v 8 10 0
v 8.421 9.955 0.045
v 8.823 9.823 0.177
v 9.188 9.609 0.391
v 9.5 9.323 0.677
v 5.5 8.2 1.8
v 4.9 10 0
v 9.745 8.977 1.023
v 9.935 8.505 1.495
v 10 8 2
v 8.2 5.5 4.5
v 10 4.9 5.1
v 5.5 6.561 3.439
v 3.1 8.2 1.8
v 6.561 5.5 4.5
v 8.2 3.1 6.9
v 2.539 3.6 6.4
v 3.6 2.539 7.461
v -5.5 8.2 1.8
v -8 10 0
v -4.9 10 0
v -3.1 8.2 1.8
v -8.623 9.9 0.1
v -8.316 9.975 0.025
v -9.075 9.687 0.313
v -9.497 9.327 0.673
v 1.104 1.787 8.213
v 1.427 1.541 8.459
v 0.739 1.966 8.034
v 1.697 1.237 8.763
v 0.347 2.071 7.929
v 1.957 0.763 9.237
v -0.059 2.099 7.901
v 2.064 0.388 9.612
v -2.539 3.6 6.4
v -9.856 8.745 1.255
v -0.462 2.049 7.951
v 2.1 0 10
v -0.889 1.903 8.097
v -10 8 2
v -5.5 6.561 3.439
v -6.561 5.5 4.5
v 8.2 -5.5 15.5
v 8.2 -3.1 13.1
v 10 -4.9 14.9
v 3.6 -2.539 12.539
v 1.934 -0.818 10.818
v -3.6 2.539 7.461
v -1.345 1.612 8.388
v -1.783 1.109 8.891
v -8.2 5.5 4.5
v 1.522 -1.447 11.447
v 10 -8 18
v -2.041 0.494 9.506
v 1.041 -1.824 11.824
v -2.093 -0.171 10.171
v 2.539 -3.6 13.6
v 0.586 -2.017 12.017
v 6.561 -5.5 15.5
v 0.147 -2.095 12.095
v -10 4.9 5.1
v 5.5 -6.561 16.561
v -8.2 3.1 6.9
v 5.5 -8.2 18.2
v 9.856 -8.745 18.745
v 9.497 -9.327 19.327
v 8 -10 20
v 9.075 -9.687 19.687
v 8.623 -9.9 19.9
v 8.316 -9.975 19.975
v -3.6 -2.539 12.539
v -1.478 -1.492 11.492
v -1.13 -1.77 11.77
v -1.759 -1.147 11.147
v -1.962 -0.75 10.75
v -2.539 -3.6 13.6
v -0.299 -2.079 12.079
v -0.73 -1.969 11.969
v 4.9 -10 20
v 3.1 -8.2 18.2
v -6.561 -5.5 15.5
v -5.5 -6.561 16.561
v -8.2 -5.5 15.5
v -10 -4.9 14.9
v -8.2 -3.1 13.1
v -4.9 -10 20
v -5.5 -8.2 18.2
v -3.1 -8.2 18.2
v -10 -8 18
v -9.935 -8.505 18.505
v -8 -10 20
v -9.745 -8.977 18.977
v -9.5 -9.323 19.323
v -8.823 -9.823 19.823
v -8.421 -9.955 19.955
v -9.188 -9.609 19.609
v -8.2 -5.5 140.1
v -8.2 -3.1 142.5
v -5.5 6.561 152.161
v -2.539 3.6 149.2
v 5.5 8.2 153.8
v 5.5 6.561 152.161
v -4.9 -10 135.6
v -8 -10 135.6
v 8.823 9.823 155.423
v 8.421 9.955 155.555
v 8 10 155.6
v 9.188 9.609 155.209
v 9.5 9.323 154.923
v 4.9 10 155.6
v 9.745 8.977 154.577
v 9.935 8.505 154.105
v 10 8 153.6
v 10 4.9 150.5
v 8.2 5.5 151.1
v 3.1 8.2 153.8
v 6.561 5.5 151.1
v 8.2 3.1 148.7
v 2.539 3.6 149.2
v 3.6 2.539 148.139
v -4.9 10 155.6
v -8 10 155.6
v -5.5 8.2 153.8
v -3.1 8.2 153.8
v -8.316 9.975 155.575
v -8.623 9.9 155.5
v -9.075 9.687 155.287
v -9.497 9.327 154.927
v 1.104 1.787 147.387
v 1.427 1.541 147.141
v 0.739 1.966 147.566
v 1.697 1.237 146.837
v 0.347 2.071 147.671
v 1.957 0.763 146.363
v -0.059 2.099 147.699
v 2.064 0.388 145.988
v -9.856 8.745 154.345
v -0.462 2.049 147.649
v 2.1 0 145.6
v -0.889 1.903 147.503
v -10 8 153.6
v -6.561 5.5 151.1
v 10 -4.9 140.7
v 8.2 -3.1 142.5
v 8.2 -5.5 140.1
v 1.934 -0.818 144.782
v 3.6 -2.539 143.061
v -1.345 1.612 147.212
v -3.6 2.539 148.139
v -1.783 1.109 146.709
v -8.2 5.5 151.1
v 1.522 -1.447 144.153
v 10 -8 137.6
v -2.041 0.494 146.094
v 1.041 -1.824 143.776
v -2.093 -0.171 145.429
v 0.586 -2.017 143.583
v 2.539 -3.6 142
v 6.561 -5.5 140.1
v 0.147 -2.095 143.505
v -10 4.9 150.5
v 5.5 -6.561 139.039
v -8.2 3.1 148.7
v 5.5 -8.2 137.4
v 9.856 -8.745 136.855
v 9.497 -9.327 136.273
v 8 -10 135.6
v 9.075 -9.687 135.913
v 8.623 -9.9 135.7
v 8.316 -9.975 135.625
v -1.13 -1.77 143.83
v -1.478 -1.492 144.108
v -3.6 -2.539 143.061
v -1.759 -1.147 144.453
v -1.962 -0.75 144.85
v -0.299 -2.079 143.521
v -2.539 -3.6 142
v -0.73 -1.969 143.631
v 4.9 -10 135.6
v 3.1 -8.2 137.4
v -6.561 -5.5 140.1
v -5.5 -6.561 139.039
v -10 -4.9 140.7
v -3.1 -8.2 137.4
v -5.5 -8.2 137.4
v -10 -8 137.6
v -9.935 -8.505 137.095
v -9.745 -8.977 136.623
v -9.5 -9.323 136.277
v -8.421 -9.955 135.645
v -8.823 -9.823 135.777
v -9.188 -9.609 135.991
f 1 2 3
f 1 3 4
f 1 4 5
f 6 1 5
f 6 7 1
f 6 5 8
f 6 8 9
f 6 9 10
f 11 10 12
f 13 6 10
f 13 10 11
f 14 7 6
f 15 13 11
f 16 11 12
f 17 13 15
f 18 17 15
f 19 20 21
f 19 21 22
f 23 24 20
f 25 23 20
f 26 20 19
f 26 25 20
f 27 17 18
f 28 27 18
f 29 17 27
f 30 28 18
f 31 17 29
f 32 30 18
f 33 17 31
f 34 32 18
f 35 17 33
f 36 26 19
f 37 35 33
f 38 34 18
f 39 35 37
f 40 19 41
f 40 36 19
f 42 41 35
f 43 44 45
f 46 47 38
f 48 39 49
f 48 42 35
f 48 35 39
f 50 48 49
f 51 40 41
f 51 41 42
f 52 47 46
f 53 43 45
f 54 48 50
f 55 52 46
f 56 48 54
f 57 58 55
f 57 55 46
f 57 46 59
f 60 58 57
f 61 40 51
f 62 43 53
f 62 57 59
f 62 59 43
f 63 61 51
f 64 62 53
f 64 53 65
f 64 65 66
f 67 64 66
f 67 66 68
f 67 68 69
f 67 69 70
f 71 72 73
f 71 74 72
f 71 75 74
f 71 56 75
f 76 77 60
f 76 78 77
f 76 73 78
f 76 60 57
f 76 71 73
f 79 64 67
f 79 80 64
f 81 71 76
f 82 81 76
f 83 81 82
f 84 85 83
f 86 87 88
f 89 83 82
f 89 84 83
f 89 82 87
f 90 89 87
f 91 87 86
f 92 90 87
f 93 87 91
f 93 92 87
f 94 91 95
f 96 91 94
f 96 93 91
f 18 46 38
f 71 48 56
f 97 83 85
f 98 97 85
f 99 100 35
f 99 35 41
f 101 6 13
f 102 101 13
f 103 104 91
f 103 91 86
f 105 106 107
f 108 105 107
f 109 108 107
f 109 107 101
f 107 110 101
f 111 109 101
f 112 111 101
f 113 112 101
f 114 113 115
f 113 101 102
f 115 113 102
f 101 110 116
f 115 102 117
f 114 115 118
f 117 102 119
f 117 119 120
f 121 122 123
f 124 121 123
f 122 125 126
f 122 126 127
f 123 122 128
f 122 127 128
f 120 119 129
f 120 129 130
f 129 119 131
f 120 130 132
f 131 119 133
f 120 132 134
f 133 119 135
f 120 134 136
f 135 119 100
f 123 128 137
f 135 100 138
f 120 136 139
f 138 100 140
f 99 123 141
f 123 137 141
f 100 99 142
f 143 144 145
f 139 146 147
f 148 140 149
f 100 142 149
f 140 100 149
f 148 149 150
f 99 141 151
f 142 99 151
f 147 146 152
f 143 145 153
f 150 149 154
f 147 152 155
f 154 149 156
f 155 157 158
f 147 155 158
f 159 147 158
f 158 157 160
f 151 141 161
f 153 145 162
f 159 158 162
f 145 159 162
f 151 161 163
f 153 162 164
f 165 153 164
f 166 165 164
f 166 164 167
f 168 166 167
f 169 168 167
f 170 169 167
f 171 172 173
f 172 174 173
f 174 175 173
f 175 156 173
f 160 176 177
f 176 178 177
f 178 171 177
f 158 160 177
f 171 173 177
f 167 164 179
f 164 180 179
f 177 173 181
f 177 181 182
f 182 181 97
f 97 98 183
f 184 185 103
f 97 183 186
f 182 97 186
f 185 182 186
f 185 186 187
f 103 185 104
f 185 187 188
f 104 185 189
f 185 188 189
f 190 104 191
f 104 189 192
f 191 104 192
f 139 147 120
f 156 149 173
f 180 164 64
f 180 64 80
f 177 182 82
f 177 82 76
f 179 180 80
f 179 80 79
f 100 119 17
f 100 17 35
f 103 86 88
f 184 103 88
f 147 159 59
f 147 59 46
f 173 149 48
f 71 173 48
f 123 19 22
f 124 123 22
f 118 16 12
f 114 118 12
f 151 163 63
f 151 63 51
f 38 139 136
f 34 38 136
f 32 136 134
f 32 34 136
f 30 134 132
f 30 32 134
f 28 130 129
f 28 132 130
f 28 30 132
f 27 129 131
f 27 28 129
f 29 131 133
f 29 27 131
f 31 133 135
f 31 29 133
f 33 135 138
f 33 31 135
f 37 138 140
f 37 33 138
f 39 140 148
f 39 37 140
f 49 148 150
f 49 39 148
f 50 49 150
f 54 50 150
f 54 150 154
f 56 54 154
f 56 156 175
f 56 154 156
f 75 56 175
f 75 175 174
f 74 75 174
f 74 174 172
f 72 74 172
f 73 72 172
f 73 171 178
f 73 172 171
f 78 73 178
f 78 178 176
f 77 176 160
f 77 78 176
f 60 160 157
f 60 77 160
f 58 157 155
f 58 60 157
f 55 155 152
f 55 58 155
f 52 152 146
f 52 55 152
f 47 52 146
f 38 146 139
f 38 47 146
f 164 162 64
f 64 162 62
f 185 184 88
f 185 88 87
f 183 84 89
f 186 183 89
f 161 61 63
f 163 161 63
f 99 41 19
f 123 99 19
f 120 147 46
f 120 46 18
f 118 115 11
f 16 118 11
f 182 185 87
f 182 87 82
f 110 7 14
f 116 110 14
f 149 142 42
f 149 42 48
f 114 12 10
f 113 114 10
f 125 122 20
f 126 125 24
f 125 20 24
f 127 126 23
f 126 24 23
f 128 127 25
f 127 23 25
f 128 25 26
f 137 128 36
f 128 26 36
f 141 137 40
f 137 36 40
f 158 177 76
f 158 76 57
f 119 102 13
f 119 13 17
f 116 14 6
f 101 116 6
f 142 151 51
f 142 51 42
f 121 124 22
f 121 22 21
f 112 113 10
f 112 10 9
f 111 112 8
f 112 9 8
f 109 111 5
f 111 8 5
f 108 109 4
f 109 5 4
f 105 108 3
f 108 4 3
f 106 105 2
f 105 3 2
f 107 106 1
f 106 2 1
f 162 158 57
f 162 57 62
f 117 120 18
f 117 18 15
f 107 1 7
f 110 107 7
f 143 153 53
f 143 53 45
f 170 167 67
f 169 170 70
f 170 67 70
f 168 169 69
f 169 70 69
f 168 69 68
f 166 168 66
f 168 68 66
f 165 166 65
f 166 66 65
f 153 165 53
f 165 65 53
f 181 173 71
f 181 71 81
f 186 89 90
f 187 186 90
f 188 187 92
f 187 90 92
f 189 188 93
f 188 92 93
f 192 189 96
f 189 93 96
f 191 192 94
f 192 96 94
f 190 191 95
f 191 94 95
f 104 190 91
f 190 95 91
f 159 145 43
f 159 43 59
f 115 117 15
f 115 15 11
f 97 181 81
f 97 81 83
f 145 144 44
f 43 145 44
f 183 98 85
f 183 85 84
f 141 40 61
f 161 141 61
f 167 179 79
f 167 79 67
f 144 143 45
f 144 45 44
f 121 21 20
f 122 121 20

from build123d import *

# Parameters (mm, degrees)
SKETCH1_R           = 2.1
BOSS_EXTRUDE1_DEPTH = 155.6
CUT_EXTRUDE1_DEPTH  = 66


with BuildPart() as part:
    # Sketch1 → Boss-Extrude1 (new body)
    with BuildSketch(Plane.XY):
        with BuildLine():
            Line((-4.9, -10), (-3.1, -8.2))
            Line((-3.1, -8.2), (-5.5, -8.2))
            Line((-5.5, -8.2), (-5.5, -6.560660172))
            Line((-5.5, -6.560660172), (-2.539339828, -3.6))
            Line((-2.539339828, -3.6), (2.539339828, -3.6))
            Line((2.539339828, -3.6), (5.5, -6.560660172))
            Line((5.5, -6.560660172), (5.5, -8.2))
            Line((5.5, -8.2), (3.1, -8.2))
            Line((3.1, -8.2), (4.9, -10))
            Line((4.9, -10), (8, -10))
            ThreePointArc((8, -10), (9.414213562, -9.414213562), (10, -8))
            Line((10, -8), (10, -4.9))
            Line((10, -4.9), (8.2, -3.1))
            Line((8.2, -3.1), (8.2, -5.5))
            Line((8.2, -5.5), (6.560660172, -5.5))
            Line((6.560660172, -5.5), (3.6, -2.539339828))
            Line((3.6, -2.539339828), (3.6, 2.539339828))
            Line((3.6, 2.539339828), (6.560660172, 5.5))
            Line((6.560660172, 5.5), (8.2, 5.5))
            Line((8.2, 5.5), (8.2, 3.1))
            Line((8.2, 3.1), (10, 4.9))
            Line((10, 4.9), (10, 8))
            ThreePointArc((10, 8), (9.414213562, 9.414213562), (8, 10))
            Line((8, 10), (4.9, 10))
            Line((4.9, 10), (3.1, 8.2))
            Line((3.1, 8.2), (5.5, 8.2))
            Line((5.5, 8.2), (5.5, 6.560660172))
            Line((5.5, 6.560660172), (2.539339828, 3.6))
            Line((2.539339828, 3.6), (-2.539339828, 3.6))
            Line((-2.539339828, 3.6), (-5.5, 6.560660172))
            Line((-5.5, 6.560660172), (-5.5, 8.2))
            Line((-5.5, 8.2), (-3.1, 8.2))
            Line((-3.1, 8.2), (-4.9, 10))
            Line((-4.9, 10), (-8, 10))
            ThreePointArc((-8, 10), (-9.414213562, 9.414213562), (-10, 8))
            Line((-10, 8), (-10, 4.9))
            Line((-10, 4.9), (-8.2, 3.1))
            Line((-8.2, 3.1), (-8.2, 5.5))
            Line((-8.2, 5.5), (-6.560660172, 5.5))
            Line((-6.560660172, 5.5), (-3.6, 2.539339828))
            Line((-3.6, 2.539339828), (-3.6, -2.539339828))
            Line((-3.6, -2.539339828), (-6.560660172, -5.5))
            Line((-6.560660172, -5.5), (-8.2, -5.5))
            Line((-8.2, -5.5), (-8.2, -3.1))
            Line((-8.2, -3.1), (-10, -4.9))
            Line((-10, -4.9), (-10, -8))
            ThreePointArc((-10, -8), (-9.414213562, -9.414213562), (-8, -10))
            Line((-8, -10), (-4.9, -10))
        make_face()
        Circle(SKETCH1_R, mode=Mode.SUBTRACT)
    extrude(amount=BOSS_EXTRUDE1_DEPTH)

    # Sketch2 → Cut-Extrude1 (cut)
    with BuildSketch(Plane.ZY.offset(10)):
        Polygon((155.6, 10), (135.6, -10), (155.6, -10), align=None)
        Polygon((0, 10), (20, -10), (0, -10), align=None)
    extrude(amount=-CUT_EXTRUDE1_DEPTH, mode=Mode.SUBTRACT)


solid = part.part
